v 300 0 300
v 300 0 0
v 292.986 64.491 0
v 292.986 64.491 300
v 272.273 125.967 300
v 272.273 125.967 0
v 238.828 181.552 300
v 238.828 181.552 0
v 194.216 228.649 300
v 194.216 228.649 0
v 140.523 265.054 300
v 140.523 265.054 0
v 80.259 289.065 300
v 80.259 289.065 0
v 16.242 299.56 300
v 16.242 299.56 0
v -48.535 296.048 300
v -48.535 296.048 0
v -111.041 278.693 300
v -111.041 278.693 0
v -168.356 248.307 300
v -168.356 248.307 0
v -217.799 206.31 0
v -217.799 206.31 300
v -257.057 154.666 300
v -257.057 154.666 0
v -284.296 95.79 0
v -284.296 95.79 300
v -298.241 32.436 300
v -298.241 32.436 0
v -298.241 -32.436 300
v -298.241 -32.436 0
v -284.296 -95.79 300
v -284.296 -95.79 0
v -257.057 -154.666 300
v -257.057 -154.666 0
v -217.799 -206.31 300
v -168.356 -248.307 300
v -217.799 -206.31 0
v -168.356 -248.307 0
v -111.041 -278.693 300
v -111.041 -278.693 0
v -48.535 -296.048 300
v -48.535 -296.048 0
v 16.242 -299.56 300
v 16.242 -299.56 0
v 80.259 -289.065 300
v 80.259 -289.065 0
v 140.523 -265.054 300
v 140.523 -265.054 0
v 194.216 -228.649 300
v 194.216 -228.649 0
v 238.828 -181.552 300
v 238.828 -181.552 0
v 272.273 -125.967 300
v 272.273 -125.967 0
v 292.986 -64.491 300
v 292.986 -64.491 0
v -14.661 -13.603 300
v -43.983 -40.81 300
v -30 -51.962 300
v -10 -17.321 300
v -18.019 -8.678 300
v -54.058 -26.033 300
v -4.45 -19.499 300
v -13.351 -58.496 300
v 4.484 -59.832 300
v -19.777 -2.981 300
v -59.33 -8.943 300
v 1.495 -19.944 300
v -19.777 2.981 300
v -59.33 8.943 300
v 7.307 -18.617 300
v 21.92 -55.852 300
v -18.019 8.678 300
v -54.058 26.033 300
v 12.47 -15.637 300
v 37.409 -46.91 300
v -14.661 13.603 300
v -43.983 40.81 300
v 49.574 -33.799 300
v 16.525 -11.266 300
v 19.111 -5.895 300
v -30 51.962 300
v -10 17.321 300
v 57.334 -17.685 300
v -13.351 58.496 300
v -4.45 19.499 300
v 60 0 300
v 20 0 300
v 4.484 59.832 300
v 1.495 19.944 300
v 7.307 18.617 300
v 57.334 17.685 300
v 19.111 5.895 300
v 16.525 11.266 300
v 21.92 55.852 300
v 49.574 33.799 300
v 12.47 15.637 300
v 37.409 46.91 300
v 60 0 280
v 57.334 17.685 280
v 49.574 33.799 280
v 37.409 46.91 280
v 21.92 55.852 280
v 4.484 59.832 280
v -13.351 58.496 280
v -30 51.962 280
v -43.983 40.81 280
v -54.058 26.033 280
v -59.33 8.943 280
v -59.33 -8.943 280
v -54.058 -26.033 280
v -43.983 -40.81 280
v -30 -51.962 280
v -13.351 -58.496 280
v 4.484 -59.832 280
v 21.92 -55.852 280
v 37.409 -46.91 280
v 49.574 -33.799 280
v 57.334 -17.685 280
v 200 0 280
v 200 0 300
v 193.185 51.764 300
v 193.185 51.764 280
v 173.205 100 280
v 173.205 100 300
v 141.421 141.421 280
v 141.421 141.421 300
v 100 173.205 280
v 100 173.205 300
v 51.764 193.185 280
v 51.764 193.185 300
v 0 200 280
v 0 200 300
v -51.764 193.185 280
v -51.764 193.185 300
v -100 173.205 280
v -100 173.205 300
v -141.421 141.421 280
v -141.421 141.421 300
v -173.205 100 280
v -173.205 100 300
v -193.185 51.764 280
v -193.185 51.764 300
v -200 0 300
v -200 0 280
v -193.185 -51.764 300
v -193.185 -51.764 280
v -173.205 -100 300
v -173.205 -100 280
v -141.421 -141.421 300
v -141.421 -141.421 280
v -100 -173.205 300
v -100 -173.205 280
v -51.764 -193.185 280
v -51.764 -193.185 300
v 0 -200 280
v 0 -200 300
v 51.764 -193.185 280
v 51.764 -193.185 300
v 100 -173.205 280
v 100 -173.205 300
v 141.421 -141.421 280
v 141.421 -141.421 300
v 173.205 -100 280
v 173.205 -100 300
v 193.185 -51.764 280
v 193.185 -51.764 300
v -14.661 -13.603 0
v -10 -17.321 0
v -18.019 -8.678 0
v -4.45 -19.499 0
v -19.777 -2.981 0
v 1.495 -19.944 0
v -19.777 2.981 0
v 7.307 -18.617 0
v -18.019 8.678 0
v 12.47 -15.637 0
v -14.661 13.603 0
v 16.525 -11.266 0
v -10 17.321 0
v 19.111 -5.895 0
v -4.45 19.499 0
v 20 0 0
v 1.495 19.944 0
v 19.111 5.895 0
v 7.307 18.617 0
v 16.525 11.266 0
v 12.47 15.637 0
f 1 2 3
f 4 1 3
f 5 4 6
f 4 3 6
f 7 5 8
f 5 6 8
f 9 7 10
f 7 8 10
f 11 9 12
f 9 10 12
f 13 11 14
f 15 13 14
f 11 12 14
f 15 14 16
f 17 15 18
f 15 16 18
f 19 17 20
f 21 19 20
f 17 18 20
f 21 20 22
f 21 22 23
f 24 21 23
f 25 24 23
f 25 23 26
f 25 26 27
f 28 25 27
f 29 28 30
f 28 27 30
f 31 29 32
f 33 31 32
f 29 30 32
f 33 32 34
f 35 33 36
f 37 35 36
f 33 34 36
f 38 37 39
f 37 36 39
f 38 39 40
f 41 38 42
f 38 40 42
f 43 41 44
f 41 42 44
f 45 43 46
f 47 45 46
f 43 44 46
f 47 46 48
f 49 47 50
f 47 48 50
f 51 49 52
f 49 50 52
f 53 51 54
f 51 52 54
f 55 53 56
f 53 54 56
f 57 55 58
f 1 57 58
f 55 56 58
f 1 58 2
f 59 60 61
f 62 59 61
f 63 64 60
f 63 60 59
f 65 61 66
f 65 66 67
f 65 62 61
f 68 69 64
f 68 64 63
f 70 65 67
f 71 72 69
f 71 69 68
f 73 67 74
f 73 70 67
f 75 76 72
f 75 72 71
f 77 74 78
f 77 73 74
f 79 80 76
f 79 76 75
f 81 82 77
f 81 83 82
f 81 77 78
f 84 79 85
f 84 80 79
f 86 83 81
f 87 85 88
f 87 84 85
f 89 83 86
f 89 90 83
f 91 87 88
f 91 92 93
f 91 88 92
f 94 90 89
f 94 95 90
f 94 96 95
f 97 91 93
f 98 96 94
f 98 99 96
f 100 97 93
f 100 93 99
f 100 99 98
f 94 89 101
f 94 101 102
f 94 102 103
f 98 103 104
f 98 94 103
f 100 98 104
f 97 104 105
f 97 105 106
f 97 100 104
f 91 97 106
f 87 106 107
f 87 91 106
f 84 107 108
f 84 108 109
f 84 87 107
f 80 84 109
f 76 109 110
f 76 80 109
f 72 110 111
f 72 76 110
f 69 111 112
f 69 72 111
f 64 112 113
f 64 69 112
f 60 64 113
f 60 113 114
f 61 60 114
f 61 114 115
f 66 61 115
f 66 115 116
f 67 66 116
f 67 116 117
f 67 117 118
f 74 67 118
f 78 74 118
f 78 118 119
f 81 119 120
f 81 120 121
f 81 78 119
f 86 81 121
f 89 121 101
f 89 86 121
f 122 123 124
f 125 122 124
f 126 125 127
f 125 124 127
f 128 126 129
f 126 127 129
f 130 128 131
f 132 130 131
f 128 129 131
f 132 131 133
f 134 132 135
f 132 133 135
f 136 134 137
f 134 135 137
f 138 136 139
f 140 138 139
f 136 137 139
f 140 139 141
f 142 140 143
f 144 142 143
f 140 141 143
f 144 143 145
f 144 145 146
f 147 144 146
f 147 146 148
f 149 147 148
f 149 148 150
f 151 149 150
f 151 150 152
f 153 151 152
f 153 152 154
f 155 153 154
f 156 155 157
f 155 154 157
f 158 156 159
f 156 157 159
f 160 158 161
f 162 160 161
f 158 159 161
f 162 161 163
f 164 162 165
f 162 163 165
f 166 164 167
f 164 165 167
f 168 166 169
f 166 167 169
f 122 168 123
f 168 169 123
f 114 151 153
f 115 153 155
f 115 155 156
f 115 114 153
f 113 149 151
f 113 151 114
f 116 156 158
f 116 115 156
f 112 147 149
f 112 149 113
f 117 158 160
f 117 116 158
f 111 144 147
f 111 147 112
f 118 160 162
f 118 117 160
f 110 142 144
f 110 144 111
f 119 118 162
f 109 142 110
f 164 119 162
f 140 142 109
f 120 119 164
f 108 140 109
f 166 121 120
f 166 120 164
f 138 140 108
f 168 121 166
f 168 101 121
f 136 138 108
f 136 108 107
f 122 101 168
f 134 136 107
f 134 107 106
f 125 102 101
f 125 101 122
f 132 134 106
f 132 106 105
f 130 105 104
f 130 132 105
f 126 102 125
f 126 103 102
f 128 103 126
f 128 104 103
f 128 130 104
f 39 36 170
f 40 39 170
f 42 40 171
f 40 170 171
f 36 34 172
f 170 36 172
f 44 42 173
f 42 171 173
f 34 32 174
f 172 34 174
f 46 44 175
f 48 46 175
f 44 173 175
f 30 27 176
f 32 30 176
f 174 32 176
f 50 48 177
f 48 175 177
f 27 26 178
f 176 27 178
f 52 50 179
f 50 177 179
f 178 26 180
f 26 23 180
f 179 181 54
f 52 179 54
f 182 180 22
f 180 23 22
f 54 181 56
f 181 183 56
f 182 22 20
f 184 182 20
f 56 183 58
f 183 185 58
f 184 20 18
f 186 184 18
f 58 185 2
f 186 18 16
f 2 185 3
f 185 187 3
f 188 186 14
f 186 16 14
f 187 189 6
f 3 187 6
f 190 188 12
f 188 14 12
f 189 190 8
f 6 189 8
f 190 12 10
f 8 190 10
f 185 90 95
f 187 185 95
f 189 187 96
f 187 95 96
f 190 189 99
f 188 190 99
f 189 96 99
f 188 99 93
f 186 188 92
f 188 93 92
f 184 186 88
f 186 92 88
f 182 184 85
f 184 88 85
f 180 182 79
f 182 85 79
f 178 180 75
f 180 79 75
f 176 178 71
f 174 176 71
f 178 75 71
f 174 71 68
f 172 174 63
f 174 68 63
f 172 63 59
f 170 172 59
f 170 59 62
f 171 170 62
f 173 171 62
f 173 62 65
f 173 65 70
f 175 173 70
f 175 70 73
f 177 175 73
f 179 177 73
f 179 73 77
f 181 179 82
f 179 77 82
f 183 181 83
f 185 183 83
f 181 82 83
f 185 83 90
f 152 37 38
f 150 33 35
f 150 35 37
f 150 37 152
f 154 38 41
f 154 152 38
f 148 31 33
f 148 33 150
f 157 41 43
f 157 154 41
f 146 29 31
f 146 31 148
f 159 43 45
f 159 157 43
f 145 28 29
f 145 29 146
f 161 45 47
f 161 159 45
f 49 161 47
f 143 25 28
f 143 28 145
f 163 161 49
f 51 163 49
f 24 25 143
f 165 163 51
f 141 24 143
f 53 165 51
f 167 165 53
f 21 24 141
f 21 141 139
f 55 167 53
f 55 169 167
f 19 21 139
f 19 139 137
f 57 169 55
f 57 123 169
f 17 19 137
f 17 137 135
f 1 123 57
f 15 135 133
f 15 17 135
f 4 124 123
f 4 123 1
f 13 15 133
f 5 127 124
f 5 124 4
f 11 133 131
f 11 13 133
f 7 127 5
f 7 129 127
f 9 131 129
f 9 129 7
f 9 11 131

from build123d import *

# Parameters (mm, degrees)
SKIZZE1_R                       = 300
AUFSATZ_LINEAR_AUSTRAGEN1_DEPTH = 300
SKIZZE2_R                       = 20
SCHNITT_LINEAR_AUSTRAGEN1_DEPTH = 300
SKIZZE3_R                       = 200
SKIZZE3_R_2                     = 60
SCHNITT_LINEAR_AUSTRAGEN2_DEPTH = 20


with BuildPart() as part:
    # Skizze1 → Aufsatz-Linear austragen1 (new body)
    with BuildSketch(Plane.XY):
        Circle(SKIZZE1_R)
    extrude(amount=AUFSATZ_LINEAR_AUSTRAGEN1_DEPTH)

    # Skizze2 → Schnitt-Linear austragen1 (cut)
    with BuildSketch(Plane.XY.offset(300)):
        Circle(SKIZZE2_R)
    extrude(amount=-SCHNITT_LINEAR_AUSTRAGEN1_DEPTH, mode=Mode.SUBTRACT)

    # Skizze3 → Schnitt-Linear austragen2 (cut)
    with BuildSketch(Plane.XY.offset(300)):
        Circle(SKIZZE3_R)
        Circle(SKIZZE3_R_2, mode=Mode.SUBTRACT)
    extrude(amount=-SCHNITT_LINEAR_AUSTRAGEN2_DEPTH, mode=Mode.SUBTRACT)


solid = part.part
